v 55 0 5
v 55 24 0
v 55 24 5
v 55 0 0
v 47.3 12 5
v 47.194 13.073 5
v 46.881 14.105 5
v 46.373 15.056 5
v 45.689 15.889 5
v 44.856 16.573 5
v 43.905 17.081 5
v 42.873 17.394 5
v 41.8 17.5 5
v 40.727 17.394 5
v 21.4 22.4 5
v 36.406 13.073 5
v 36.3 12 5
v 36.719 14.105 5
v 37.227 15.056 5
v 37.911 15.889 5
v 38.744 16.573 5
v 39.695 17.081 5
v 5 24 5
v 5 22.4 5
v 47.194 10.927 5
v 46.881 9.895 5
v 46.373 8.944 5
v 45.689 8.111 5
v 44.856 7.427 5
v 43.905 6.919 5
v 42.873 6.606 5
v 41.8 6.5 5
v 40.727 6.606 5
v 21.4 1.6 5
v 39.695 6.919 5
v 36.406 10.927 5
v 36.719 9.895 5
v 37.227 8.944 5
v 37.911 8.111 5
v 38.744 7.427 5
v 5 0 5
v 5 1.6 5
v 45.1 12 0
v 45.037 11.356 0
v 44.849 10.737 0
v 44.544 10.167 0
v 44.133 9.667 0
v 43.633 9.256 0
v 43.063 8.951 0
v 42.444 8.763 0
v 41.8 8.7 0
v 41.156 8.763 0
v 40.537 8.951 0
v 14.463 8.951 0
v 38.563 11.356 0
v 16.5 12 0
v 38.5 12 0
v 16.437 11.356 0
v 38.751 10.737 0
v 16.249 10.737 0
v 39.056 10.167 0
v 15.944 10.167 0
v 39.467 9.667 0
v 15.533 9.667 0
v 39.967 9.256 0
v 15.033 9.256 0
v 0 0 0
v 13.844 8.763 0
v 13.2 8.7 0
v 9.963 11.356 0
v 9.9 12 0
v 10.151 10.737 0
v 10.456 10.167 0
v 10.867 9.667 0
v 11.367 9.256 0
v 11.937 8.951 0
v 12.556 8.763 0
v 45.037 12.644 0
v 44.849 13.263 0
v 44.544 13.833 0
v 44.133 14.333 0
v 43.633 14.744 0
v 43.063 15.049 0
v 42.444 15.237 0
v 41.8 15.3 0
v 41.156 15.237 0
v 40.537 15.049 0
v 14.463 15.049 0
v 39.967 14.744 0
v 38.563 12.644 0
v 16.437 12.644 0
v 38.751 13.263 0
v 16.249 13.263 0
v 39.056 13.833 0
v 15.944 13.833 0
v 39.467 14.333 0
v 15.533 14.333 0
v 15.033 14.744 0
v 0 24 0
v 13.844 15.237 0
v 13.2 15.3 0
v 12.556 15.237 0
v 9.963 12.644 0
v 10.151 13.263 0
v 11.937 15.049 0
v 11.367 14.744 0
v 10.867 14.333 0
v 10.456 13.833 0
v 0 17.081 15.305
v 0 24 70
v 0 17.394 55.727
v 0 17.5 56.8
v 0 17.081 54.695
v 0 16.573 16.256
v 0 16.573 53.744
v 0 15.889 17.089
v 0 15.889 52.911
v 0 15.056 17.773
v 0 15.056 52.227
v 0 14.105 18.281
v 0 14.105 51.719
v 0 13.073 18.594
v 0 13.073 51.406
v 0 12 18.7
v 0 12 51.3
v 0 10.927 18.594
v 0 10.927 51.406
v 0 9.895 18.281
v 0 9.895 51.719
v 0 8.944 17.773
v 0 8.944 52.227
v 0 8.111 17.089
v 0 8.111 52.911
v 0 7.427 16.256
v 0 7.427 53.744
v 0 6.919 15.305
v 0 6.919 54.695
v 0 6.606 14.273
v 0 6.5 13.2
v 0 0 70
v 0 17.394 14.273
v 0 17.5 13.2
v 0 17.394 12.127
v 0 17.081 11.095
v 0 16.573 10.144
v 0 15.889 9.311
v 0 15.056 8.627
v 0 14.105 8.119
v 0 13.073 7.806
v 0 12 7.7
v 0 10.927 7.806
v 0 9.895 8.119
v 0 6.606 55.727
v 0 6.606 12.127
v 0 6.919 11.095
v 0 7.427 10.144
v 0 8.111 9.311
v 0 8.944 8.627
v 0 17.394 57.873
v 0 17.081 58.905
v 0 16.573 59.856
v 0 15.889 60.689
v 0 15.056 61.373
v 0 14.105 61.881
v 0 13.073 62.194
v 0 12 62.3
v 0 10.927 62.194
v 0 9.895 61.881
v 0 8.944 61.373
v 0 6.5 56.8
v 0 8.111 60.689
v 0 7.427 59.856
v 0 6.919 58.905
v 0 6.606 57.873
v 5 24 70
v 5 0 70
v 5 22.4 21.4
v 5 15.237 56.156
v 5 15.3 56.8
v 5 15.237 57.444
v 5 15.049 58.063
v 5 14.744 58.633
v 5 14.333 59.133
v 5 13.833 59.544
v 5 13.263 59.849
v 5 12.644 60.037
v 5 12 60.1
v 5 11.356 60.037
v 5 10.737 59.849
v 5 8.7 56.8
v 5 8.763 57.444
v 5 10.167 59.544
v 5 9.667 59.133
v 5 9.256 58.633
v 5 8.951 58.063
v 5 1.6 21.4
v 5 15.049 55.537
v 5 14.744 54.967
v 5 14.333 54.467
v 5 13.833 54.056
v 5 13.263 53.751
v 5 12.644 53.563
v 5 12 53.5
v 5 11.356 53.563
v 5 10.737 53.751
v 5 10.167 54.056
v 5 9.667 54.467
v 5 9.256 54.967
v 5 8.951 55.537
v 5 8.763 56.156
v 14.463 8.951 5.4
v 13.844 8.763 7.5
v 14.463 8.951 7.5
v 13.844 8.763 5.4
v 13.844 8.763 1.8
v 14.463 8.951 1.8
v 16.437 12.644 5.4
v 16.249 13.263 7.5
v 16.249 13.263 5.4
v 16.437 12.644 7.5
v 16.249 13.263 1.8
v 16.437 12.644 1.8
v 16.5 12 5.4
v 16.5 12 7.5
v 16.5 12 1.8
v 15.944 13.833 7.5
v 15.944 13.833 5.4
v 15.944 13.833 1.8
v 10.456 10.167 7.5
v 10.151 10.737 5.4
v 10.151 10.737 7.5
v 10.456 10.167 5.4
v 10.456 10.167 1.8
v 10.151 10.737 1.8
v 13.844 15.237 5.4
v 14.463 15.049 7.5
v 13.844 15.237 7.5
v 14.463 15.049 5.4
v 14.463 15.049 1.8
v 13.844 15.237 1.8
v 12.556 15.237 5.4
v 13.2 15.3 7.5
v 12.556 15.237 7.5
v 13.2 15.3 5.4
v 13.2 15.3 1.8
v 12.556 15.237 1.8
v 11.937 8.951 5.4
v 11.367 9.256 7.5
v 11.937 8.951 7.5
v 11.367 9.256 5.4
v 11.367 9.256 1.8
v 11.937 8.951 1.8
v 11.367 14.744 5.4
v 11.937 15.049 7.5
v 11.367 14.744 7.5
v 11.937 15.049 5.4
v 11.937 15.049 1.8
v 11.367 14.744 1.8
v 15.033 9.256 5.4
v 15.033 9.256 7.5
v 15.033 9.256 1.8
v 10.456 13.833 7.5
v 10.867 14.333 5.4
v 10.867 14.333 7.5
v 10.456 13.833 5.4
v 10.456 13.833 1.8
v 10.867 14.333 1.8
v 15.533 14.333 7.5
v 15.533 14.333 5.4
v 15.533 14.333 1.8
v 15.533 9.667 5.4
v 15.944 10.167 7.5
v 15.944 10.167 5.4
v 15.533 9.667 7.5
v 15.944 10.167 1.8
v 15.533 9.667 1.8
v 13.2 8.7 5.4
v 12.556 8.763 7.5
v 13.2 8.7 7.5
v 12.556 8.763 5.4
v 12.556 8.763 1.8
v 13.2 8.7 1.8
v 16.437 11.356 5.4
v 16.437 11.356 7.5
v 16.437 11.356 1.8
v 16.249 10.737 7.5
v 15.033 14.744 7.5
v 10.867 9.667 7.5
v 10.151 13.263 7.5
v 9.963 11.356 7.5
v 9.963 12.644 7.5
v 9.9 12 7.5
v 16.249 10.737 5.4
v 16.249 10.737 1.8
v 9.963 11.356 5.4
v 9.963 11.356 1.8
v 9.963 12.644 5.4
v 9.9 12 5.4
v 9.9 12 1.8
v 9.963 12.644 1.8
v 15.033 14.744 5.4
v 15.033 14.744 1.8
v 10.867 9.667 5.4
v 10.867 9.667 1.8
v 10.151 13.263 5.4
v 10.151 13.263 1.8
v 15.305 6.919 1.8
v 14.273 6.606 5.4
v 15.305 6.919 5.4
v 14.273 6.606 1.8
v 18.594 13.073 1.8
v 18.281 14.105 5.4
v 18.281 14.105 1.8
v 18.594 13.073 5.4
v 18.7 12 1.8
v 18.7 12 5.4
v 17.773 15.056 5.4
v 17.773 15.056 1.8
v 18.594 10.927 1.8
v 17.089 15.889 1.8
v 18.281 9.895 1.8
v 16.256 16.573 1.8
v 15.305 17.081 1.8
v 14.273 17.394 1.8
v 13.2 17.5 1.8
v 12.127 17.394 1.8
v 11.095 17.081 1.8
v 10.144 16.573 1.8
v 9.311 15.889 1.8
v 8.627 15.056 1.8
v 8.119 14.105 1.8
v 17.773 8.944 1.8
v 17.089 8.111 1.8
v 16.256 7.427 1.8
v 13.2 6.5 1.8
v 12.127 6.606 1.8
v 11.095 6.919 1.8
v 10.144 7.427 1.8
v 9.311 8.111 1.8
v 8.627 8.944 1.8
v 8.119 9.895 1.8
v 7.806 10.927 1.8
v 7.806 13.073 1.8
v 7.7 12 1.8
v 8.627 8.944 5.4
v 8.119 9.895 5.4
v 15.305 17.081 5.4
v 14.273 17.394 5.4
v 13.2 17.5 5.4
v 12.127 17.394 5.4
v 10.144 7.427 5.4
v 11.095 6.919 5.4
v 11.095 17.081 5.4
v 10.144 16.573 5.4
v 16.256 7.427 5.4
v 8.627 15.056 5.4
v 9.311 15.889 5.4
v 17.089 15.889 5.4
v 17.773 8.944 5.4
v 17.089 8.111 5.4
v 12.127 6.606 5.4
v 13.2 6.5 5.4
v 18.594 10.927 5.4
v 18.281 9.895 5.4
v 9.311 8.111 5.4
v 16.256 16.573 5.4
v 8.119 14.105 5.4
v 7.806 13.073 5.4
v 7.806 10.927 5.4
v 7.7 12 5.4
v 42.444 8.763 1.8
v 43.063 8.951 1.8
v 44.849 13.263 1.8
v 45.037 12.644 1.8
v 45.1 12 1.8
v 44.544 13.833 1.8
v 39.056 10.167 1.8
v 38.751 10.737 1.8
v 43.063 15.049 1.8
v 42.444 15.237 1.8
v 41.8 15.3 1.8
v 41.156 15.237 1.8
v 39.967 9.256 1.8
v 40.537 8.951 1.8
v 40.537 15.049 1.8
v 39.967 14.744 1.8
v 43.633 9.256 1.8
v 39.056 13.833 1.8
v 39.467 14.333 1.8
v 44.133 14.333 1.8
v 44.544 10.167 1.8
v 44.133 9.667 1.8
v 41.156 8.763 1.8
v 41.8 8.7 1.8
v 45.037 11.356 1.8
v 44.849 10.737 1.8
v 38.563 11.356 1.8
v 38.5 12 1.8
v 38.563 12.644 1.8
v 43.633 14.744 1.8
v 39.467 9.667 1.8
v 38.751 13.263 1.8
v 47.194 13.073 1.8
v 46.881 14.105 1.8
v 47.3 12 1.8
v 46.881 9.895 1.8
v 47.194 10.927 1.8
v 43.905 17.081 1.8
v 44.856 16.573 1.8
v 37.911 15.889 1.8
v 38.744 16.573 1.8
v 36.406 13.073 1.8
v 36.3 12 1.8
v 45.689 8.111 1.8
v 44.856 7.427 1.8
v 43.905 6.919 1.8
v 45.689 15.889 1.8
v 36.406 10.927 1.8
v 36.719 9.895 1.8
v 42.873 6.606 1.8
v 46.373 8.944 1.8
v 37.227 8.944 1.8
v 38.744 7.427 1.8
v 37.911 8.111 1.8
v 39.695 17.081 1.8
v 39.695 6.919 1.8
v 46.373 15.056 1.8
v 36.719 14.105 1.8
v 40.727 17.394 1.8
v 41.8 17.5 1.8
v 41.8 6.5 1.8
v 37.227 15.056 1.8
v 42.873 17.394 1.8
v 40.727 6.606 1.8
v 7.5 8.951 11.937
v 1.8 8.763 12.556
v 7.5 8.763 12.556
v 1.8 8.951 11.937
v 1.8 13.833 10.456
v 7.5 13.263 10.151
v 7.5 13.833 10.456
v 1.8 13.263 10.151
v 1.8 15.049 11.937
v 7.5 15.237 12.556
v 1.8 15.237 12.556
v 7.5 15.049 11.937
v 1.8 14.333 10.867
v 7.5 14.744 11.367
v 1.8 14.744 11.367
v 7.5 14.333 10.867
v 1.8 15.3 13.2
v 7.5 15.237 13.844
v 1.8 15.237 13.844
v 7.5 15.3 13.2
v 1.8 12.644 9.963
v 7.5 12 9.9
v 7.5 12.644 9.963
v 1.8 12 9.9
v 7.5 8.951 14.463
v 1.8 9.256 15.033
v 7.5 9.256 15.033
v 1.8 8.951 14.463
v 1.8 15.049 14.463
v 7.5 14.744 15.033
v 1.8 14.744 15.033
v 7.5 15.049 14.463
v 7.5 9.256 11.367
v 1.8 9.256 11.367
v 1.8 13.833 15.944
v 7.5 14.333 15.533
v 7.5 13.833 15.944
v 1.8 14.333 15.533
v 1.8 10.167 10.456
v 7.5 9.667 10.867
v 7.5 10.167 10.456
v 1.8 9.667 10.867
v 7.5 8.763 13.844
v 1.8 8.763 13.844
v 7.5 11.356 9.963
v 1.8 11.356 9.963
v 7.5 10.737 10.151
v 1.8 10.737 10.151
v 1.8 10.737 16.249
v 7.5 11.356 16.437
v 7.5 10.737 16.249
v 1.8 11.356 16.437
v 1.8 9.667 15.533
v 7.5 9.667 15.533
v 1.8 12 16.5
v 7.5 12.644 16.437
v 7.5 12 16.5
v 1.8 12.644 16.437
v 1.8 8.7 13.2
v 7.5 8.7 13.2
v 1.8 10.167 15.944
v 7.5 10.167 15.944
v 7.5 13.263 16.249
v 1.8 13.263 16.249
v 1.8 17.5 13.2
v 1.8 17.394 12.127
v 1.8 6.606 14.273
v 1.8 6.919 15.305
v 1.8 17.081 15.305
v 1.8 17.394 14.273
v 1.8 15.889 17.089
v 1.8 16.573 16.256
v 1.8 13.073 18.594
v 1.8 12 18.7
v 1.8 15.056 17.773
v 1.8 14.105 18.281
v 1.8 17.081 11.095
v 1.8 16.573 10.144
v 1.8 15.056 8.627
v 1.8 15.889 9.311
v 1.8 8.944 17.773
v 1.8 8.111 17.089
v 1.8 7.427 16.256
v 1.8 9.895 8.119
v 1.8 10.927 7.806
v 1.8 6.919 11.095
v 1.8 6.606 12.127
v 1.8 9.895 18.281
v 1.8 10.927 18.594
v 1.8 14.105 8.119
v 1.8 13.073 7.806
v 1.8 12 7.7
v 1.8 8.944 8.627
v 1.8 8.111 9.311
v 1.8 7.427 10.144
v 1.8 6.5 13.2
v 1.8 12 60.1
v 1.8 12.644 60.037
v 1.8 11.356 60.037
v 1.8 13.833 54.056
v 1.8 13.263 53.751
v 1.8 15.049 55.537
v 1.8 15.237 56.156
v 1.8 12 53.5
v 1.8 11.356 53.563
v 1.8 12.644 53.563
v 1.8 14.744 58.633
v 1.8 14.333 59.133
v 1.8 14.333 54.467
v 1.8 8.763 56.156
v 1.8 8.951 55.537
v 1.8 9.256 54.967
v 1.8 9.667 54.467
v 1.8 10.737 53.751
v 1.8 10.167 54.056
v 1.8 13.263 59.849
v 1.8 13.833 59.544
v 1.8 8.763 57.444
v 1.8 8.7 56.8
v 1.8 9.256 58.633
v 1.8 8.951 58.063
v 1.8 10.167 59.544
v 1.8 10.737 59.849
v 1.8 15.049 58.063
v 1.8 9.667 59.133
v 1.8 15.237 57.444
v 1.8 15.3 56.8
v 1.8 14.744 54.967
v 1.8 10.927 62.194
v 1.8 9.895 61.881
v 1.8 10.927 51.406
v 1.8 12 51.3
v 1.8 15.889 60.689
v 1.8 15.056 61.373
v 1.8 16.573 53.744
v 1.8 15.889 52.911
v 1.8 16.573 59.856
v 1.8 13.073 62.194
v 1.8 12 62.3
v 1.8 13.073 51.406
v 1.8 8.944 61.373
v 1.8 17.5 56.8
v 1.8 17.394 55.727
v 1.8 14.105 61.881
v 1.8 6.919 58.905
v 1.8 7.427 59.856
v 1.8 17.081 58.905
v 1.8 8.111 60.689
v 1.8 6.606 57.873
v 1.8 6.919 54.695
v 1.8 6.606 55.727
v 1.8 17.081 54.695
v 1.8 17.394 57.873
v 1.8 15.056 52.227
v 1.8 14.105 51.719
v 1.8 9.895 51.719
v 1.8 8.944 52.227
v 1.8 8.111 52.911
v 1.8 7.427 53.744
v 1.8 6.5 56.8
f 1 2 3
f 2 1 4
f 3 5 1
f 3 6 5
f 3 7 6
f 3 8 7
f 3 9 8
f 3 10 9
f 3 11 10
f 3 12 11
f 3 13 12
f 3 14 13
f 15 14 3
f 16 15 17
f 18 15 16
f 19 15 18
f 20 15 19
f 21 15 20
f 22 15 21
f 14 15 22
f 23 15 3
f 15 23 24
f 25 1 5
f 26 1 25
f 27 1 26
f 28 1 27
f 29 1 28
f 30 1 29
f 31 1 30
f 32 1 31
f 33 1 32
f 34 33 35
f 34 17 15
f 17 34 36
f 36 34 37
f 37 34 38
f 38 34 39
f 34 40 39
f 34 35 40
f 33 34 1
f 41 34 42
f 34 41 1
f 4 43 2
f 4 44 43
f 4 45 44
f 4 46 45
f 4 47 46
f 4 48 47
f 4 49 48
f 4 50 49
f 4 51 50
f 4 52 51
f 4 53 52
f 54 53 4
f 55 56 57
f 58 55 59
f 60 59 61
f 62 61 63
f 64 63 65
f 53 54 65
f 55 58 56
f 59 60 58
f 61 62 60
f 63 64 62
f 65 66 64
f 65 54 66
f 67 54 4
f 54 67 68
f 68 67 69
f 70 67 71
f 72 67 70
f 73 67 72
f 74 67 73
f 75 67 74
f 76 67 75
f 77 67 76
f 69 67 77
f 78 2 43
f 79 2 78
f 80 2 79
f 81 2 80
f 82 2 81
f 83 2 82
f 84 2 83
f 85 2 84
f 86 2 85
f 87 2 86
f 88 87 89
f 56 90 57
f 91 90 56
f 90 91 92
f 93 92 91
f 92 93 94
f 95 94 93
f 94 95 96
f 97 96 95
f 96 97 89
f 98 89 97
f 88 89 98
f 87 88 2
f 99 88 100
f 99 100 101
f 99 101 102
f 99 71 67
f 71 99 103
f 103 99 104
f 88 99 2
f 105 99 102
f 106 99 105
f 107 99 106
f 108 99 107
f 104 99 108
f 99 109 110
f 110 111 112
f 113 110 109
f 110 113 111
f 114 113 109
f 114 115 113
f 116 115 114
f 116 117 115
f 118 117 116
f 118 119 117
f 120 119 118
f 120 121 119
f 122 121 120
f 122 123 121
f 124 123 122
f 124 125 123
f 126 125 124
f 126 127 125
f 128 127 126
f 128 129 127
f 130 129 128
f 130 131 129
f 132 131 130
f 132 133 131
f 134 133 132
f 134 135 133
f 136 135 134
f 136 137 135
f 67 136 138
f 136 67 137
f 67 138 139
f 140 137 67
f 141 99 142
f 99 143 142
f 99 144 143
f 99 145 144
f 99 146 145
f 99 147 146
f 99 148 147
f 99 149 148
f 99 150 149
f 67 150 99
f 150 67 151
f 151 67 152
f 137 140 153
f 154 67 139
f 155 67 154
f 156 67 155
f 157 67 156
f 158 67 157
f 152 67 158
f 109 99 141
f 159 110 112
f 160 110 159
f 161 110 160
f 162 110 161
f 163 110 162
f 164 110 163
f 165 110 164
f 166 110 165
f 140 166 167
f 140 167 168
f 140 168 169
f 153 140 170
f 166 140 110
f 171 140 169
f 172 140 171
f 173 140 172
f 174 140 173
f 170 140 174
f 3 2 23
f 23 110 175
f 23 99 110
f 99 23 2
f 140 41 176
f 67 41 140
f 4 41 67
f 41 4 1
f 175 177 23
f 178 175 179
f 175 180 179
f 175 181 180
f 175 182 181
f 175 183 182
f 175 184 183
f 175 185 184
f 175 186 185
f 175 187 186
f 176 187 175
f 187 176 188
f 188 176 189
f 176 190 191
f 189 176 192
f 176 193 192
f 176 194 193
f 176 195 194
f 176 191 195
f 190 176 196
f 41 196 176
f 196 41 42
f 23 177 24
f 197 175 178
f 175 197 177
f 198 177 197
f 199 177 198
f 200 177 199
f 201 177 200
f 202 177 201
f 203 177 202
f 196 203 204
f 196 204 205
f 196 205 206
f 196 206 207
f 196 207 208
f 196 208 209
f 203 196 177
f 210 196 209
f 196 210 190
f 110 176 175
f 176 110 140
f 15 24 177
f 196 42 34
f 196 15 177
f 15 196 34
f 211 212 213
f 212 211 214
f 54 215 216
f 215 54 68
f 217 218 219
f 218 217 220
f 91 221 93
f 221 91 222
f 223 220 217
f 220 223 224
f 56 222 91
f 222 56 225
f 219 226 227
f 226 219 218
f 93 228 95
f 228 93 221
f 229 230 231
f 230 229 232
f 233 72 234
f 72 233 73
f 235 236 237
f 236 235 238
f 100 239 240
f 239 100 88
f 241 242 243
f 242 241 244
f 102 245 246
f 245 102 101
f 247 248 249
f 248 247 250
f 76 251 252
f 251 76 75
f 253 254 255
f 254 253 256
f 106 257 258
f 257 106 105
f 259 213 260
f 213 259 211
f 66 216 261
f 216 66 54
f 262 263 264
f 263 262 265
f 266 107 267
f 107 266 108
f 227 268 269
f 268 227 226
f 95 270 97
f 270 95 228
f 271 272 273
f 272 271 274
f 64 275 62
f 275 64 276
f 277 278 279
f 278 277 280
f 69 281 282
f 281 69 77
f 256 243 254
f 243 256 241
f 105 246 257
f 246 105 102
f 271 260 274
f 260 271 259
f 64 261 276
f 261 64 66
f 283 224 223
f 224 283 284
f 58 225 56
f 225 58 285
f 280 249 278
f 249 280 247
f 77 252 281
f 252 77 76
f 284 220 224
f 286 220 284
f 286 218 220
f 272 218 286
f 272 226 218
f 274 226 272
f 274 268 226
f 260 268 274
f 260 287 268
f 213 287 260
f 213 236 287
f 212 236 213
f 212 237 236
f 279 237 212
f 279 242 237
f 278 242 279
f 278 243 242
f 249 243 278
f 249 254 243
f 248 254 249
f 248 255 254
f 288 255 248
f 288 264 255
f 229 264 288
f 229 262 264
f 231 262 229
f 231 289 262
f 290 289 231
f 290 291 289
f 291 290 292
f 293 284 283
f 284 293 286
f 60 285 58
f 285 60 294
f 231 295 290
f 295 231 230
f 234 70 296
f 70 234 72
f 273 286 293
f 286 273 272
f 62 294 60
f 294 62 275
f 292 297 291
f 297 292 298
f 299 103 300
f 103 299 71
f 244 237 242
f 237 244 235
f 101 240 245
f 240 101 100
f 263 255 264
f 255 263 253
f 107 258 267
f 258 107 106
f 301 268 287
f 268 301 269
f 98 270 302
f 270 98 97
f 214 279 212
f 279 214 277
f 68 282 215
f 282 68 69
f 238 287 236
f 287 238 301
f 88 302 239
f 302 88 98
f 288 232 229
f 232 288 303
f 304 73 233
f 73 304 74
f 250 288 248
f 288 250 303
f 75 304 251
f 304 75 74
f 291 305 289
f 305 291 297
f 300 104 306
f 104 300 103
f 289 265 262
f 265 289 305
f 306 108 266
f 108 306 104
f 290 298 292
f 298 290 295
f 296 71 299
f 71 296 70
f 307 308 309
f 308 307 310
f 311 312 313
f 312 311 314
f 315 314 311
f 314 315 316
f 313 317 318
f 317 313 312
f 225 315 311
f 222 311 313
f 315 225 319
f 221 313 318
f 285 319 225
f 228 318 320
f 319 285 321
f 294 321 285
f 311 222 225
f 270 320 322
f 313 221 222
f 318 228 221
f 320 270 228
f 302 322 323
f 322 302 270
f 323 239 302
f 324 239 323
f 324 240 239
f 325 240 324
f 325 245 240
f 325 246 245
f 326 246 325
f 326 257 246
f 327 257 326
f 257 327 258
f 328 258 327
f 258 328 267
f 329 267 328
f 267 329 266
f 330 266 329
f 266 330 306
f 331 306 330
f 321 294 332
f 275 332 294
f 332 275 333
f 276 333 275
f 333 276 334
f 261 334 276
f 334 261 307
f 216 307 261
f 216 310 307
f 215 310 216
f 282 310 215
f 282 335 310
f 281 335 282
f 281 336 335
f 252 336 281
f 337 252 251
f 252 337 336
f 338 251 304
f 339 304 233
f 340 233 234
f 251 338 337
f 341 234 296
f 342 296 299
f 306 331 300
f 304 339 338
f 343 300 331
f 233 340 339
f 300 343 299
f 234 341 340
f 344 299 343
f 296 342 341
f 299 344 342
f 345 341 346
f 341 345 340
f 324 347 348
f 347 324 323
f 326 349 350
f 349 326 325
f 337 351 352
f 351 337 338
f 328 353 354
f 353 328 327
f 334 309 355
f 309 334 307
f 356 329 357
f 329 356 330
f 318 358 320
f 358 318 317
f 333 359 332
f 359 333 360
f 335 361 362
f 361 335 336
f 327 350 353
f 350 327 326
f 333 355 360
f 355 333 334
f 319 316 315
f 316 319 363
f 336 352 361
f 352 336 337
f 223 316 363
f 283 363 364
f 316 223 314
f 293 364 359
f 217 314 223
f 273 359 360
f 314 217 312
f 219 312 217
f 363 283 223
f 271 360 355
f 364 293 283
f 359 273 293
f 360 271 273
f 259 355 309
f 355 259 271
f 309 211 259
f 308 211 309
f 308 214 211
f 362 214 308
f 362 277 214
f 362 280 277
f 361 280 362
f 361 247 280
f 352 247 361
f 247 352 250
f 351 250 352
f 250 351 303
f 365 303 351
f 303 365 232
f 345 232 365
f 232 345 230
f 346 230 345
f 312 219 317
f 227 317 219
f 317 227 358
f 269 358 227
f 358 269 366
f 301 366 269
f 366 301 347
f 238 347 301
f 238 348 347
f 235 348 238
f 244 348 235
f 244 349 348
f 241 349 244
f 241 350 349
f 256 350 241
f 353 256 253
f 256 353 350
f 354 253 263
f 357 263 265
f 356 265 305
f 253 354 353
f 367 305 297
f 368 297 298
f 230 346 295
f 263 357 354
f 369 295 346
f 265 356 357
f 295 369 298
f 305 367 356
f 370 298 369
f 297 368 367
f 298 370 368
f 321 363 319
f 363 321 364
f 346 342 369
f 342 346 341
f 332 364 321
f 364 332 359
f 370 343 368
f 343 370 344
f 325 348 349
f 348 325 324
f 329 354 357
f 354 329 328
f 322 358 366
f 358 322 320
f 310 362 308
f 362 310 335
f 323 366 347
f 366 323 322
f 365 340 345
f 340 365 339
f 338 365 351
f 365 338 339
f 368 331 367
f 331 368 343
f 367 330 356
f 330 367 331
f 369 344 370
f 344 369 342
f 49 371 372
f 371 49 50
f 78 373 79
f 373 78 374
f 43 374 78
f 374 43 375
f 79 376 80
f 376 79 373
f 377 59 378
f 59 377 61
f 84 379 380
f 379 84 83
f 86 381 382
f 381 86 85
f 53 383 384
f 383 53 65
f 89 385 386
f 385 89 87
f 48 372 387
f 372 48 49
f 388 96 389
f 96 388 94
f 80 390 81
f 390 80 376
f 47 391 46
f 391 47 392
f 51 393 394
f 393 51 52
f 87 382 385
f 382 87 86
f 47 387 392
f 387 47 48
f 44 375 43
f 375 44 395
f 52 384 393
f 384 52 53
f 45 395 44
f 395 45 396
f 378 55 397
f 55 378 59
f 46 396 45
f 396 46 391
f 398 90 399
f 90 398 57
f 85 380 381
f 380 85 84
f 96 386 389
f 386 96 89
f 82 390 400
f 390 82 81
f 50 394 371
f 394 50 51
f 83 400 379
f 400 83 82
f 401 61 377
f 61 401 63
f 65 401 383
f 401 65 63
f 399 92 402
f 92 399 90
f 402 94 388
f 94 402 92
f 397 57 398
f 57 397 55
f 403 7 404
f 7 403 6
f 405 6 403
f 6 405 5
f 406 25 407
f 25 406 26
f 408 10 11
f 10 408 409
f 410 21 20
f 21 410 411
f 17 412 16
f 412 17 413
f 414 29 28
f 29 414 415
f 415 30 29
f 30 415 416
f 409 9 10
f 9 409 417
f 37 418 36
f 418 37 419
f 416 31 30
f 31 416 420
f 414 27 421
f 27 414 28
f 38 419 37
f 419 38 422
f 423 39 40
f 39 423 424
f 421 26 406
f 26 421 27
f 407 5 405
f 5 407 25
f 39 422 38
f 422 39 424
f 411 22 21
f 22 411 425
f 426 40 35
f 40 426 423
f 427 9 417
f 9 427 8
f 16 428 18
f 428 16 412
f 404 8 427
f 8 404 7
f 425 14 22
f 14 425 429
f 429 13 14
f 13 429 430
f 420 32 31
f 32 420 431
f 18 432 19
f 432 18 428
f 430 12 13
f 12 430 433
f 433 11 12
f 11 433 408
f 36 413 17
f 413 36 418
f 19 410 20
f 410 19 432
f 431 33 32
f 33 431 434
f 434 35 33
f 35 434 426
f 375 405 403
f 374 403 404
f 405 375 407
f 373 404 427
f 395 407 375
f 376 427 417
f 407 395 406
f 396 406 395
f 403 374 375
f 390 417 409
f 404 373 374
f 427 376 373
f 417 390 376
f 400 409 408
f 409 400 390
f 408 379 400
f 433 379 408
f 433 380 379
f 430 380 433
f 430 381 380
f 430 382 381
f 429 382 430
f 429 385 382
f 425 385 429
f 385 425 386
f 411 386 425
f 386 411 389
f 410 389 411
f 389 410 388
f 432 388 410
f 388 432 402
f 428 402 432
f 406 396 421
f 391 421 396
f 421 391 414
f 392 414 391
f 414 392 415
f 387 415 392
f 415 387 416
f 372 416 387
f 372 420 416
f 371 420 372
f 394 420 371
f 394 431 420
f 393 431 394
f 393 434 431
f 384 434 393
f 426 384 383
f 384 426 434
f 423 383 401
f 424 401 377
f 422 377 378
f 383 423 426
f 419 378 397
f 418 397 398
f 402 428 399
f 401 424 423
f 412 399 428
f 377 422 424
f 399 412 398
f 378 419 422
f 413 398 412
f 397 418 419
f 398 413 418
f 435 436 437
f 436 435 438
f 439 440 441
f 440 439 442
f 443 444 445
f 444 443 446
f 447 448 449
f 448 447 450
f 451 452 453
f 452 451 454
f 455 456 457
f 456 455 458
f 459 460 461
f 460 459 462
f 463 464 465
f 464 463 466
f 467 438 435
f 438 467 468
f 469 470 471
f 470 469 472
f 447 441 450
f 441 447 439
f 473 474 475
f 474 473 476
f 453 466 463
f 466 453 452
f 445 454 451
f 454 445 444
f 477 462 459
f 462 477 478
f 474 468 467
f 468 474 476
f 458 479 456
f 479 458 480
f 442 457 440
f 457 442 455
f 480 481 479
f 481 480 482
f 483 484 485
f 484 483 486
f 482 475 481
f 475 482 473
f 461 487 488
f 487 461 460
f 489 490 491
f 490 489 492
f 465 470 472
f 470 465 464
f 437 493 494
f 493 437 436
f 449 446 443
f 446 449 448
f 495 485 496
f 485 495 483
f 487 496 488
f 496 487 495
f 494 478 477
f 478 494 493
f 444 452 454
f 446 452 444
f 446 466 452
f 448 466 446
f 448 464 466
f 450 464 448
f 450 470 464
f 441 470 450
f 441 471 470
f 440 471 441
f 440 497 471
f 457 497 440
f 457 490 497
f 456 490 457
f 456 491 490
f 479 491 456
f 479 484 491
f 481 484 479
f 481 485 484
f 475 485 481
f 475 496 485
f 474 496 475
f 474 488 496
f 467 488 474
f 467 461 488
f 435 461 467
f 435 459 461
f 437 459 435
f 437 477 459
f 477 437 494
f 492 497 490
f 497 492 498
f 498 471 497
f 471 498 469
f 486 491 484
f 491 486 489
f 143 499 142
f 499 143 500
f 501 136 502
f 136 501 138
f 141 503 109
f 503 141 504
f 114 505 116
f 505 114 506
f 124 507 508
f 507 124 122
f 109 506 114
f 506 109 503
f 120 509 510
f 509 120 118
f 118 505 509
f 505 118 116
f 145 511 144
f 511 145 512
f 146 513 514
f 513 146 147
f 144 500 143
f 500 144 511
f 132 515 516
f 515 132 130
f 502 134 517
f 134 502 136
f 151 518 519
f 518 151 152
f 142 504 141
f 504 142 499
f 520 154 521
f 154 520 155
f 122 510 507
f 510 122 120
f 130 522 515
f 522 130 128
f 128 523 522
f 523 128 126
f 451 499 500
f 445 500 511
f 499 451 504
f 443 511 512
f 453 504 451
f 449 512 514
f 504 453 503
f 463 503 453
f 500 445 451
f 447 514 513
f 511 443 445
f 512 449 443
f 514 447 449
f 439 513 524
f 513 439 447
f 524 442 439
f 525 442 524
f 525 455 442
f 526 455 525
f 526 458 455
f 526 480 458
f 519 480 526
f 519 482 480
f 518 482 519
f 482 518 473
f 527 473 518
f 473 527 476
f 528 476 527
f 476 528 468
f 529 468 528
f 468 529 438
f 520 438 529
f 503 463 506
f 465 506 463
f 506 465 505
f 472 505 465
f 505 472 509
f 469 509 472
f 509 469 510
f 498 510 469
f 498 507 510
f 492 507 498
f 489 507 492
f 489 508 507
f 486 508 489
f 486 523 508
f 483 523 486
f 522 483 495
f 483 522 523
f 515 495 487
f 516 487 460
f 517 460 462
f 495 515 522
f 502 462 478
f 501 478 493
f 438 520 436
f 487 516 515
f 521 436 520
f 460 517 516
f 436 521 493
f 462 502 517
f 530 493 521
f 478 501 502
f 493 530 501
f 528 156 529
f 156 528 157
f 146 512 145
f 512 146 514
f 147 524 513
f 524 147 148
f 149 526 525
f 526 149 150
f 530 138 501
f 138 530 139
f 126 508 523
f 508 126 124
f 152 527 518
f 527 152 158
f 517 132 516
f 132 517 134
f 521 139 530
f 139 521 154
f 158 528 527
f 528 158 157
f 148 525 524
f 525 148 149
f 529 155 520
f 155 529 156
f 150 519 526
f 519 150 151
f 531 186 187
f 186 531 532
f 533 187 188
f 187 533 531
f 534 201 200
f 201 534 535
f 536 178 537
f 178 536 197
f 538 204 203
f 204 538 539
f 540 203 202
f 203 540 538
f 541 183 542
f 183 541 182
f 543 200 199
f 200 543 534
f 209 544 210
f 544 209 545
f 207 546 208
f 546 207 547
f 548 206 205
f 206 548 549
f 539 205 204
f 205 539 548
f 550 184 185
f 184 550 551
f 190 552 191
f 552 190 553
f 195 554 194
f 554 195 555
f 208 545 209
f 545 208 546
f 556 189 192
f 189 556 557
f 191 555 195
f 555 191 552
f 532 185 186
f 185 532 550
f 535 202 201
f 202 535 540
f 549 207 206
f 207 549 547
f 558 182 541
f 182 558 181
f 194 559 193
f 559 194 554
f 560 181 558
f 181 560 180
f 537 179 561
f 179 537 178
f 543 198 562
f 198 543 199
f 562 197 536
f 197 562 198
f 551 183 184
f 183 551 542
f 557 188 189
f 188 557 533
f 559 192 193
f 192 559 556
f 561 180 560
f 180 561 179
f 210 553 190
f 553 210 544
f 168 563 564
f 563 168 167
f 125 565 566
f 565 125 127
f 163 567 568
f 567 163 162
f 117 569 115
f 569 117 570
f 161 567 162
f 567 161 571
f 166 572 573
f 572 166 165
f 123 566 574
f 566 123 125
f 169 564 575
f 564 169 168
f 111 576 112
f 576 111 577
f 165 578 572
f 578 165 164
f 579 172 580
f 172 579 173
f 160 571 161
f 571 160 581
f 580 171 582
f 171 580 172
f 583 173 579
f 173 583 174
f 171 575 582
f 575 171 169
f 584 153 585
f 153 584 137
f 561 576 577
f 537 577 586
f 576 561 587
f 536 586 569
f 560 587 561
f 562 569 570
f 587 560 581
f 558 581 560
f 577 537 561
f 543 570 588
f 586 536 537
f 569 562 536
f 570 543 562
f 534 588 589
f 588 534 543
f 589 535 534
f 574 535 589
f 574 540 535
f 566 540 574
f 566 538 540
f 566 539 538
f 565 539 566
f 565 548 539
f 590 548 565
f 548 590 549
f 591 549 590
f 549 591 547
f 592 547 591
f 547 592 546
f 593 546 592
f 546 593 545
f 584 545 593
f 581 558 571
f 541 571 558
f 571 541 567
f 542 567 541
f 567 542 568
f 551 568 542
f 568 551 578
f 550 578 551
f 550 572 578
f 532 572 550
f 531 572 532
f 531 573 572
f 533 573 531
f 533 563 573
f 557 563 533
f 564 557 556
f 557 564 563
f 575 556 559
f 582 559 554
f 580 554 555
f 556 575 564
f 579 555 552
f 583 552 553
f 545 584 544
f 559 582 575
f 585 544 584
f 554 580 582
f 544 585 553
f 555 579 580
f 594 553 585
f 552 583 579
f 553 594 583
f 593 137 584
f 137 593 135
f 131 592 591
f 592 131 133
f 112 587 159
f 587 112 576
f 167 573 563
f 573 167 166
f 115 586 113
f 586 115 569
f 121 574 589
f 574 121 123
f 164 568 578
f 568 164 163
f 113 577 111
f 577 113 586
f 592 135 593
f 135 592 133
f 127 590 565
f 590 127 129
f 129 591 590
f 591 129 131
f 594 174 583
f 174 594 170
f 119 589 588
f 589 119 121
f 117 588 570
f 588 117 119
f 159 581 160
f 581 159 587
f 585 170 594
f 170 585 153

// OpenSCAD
$fn = 32;

// ----------------------------------------------------------------------
// L-bracket: 55 x 24 x 70 mm
// ----------------------------------------------------------------------

// --- parameters (mm) ---
horiz_len = 55;           // horizontal leg, X
vert_len = 70;            // vertical leg, Z
profile_w = 24;           // bracket depth, Y
plate_t = 5;              // plate thickness
hole_d = 6.6;             // clearance for M6
cb_d = 11;                // counterbore seat
cb_h = 3.2;               // counterbore depth
rib_leg = 24.8;           // gusset leg
rib_sink = 1.6;           // gusset overlap into the plates

module hole_z(px, py) {
  translate([px, py, -2.5]) cylinder(h = plate_t + 5, d = hole_d);
}
module hole_x(pz, py) {
  translate([-2.5, py, pz]) rotate([0, 90, 0]) cylinder(h = plate_t + 5, d = hole_d);
}
module cb_z(px, py) {
  translate([px, py, plate_t - cb_h]) cylinder(h = cb_h + 0.4, d = cb_d);
}
module cb_x(pz, py) {
  translate([plate_t - cb_h, py, pz]) rotate([0, -90, 0]) cylinder(h = cb_h + 0.4, d = cb_d);
}
module gusset() {
  translate([0, profile_w - rib_sink, 0])
    rotate([90, 0, 0])
      linear_extrude(height = profile_w - 2 * rib_sink)
        polygon(points = [[rib_sink, rib_sink], [rib_leg, rib_sink], [rib_sink, rib_leg]]);
}

difference() {
  union() {
    /* horizontal leg */
    cube([horiz_len, profile_w, plate_t]);
    /* vertical leg, overlapping the corner block */
    cube([plate_t, profile_w, vert_len]);
    gusset();
  }
  hole_z(13.2, 12);
  cb_z(13.2, 12);
  hole_z(41.8, 12);
  cb_z(41.8, 12);
  hole_x(13.2, 12);
  cb_x(13.2, 12);
  hole_x(56.8, 12);
  cb_x(56.8, 12);
}
